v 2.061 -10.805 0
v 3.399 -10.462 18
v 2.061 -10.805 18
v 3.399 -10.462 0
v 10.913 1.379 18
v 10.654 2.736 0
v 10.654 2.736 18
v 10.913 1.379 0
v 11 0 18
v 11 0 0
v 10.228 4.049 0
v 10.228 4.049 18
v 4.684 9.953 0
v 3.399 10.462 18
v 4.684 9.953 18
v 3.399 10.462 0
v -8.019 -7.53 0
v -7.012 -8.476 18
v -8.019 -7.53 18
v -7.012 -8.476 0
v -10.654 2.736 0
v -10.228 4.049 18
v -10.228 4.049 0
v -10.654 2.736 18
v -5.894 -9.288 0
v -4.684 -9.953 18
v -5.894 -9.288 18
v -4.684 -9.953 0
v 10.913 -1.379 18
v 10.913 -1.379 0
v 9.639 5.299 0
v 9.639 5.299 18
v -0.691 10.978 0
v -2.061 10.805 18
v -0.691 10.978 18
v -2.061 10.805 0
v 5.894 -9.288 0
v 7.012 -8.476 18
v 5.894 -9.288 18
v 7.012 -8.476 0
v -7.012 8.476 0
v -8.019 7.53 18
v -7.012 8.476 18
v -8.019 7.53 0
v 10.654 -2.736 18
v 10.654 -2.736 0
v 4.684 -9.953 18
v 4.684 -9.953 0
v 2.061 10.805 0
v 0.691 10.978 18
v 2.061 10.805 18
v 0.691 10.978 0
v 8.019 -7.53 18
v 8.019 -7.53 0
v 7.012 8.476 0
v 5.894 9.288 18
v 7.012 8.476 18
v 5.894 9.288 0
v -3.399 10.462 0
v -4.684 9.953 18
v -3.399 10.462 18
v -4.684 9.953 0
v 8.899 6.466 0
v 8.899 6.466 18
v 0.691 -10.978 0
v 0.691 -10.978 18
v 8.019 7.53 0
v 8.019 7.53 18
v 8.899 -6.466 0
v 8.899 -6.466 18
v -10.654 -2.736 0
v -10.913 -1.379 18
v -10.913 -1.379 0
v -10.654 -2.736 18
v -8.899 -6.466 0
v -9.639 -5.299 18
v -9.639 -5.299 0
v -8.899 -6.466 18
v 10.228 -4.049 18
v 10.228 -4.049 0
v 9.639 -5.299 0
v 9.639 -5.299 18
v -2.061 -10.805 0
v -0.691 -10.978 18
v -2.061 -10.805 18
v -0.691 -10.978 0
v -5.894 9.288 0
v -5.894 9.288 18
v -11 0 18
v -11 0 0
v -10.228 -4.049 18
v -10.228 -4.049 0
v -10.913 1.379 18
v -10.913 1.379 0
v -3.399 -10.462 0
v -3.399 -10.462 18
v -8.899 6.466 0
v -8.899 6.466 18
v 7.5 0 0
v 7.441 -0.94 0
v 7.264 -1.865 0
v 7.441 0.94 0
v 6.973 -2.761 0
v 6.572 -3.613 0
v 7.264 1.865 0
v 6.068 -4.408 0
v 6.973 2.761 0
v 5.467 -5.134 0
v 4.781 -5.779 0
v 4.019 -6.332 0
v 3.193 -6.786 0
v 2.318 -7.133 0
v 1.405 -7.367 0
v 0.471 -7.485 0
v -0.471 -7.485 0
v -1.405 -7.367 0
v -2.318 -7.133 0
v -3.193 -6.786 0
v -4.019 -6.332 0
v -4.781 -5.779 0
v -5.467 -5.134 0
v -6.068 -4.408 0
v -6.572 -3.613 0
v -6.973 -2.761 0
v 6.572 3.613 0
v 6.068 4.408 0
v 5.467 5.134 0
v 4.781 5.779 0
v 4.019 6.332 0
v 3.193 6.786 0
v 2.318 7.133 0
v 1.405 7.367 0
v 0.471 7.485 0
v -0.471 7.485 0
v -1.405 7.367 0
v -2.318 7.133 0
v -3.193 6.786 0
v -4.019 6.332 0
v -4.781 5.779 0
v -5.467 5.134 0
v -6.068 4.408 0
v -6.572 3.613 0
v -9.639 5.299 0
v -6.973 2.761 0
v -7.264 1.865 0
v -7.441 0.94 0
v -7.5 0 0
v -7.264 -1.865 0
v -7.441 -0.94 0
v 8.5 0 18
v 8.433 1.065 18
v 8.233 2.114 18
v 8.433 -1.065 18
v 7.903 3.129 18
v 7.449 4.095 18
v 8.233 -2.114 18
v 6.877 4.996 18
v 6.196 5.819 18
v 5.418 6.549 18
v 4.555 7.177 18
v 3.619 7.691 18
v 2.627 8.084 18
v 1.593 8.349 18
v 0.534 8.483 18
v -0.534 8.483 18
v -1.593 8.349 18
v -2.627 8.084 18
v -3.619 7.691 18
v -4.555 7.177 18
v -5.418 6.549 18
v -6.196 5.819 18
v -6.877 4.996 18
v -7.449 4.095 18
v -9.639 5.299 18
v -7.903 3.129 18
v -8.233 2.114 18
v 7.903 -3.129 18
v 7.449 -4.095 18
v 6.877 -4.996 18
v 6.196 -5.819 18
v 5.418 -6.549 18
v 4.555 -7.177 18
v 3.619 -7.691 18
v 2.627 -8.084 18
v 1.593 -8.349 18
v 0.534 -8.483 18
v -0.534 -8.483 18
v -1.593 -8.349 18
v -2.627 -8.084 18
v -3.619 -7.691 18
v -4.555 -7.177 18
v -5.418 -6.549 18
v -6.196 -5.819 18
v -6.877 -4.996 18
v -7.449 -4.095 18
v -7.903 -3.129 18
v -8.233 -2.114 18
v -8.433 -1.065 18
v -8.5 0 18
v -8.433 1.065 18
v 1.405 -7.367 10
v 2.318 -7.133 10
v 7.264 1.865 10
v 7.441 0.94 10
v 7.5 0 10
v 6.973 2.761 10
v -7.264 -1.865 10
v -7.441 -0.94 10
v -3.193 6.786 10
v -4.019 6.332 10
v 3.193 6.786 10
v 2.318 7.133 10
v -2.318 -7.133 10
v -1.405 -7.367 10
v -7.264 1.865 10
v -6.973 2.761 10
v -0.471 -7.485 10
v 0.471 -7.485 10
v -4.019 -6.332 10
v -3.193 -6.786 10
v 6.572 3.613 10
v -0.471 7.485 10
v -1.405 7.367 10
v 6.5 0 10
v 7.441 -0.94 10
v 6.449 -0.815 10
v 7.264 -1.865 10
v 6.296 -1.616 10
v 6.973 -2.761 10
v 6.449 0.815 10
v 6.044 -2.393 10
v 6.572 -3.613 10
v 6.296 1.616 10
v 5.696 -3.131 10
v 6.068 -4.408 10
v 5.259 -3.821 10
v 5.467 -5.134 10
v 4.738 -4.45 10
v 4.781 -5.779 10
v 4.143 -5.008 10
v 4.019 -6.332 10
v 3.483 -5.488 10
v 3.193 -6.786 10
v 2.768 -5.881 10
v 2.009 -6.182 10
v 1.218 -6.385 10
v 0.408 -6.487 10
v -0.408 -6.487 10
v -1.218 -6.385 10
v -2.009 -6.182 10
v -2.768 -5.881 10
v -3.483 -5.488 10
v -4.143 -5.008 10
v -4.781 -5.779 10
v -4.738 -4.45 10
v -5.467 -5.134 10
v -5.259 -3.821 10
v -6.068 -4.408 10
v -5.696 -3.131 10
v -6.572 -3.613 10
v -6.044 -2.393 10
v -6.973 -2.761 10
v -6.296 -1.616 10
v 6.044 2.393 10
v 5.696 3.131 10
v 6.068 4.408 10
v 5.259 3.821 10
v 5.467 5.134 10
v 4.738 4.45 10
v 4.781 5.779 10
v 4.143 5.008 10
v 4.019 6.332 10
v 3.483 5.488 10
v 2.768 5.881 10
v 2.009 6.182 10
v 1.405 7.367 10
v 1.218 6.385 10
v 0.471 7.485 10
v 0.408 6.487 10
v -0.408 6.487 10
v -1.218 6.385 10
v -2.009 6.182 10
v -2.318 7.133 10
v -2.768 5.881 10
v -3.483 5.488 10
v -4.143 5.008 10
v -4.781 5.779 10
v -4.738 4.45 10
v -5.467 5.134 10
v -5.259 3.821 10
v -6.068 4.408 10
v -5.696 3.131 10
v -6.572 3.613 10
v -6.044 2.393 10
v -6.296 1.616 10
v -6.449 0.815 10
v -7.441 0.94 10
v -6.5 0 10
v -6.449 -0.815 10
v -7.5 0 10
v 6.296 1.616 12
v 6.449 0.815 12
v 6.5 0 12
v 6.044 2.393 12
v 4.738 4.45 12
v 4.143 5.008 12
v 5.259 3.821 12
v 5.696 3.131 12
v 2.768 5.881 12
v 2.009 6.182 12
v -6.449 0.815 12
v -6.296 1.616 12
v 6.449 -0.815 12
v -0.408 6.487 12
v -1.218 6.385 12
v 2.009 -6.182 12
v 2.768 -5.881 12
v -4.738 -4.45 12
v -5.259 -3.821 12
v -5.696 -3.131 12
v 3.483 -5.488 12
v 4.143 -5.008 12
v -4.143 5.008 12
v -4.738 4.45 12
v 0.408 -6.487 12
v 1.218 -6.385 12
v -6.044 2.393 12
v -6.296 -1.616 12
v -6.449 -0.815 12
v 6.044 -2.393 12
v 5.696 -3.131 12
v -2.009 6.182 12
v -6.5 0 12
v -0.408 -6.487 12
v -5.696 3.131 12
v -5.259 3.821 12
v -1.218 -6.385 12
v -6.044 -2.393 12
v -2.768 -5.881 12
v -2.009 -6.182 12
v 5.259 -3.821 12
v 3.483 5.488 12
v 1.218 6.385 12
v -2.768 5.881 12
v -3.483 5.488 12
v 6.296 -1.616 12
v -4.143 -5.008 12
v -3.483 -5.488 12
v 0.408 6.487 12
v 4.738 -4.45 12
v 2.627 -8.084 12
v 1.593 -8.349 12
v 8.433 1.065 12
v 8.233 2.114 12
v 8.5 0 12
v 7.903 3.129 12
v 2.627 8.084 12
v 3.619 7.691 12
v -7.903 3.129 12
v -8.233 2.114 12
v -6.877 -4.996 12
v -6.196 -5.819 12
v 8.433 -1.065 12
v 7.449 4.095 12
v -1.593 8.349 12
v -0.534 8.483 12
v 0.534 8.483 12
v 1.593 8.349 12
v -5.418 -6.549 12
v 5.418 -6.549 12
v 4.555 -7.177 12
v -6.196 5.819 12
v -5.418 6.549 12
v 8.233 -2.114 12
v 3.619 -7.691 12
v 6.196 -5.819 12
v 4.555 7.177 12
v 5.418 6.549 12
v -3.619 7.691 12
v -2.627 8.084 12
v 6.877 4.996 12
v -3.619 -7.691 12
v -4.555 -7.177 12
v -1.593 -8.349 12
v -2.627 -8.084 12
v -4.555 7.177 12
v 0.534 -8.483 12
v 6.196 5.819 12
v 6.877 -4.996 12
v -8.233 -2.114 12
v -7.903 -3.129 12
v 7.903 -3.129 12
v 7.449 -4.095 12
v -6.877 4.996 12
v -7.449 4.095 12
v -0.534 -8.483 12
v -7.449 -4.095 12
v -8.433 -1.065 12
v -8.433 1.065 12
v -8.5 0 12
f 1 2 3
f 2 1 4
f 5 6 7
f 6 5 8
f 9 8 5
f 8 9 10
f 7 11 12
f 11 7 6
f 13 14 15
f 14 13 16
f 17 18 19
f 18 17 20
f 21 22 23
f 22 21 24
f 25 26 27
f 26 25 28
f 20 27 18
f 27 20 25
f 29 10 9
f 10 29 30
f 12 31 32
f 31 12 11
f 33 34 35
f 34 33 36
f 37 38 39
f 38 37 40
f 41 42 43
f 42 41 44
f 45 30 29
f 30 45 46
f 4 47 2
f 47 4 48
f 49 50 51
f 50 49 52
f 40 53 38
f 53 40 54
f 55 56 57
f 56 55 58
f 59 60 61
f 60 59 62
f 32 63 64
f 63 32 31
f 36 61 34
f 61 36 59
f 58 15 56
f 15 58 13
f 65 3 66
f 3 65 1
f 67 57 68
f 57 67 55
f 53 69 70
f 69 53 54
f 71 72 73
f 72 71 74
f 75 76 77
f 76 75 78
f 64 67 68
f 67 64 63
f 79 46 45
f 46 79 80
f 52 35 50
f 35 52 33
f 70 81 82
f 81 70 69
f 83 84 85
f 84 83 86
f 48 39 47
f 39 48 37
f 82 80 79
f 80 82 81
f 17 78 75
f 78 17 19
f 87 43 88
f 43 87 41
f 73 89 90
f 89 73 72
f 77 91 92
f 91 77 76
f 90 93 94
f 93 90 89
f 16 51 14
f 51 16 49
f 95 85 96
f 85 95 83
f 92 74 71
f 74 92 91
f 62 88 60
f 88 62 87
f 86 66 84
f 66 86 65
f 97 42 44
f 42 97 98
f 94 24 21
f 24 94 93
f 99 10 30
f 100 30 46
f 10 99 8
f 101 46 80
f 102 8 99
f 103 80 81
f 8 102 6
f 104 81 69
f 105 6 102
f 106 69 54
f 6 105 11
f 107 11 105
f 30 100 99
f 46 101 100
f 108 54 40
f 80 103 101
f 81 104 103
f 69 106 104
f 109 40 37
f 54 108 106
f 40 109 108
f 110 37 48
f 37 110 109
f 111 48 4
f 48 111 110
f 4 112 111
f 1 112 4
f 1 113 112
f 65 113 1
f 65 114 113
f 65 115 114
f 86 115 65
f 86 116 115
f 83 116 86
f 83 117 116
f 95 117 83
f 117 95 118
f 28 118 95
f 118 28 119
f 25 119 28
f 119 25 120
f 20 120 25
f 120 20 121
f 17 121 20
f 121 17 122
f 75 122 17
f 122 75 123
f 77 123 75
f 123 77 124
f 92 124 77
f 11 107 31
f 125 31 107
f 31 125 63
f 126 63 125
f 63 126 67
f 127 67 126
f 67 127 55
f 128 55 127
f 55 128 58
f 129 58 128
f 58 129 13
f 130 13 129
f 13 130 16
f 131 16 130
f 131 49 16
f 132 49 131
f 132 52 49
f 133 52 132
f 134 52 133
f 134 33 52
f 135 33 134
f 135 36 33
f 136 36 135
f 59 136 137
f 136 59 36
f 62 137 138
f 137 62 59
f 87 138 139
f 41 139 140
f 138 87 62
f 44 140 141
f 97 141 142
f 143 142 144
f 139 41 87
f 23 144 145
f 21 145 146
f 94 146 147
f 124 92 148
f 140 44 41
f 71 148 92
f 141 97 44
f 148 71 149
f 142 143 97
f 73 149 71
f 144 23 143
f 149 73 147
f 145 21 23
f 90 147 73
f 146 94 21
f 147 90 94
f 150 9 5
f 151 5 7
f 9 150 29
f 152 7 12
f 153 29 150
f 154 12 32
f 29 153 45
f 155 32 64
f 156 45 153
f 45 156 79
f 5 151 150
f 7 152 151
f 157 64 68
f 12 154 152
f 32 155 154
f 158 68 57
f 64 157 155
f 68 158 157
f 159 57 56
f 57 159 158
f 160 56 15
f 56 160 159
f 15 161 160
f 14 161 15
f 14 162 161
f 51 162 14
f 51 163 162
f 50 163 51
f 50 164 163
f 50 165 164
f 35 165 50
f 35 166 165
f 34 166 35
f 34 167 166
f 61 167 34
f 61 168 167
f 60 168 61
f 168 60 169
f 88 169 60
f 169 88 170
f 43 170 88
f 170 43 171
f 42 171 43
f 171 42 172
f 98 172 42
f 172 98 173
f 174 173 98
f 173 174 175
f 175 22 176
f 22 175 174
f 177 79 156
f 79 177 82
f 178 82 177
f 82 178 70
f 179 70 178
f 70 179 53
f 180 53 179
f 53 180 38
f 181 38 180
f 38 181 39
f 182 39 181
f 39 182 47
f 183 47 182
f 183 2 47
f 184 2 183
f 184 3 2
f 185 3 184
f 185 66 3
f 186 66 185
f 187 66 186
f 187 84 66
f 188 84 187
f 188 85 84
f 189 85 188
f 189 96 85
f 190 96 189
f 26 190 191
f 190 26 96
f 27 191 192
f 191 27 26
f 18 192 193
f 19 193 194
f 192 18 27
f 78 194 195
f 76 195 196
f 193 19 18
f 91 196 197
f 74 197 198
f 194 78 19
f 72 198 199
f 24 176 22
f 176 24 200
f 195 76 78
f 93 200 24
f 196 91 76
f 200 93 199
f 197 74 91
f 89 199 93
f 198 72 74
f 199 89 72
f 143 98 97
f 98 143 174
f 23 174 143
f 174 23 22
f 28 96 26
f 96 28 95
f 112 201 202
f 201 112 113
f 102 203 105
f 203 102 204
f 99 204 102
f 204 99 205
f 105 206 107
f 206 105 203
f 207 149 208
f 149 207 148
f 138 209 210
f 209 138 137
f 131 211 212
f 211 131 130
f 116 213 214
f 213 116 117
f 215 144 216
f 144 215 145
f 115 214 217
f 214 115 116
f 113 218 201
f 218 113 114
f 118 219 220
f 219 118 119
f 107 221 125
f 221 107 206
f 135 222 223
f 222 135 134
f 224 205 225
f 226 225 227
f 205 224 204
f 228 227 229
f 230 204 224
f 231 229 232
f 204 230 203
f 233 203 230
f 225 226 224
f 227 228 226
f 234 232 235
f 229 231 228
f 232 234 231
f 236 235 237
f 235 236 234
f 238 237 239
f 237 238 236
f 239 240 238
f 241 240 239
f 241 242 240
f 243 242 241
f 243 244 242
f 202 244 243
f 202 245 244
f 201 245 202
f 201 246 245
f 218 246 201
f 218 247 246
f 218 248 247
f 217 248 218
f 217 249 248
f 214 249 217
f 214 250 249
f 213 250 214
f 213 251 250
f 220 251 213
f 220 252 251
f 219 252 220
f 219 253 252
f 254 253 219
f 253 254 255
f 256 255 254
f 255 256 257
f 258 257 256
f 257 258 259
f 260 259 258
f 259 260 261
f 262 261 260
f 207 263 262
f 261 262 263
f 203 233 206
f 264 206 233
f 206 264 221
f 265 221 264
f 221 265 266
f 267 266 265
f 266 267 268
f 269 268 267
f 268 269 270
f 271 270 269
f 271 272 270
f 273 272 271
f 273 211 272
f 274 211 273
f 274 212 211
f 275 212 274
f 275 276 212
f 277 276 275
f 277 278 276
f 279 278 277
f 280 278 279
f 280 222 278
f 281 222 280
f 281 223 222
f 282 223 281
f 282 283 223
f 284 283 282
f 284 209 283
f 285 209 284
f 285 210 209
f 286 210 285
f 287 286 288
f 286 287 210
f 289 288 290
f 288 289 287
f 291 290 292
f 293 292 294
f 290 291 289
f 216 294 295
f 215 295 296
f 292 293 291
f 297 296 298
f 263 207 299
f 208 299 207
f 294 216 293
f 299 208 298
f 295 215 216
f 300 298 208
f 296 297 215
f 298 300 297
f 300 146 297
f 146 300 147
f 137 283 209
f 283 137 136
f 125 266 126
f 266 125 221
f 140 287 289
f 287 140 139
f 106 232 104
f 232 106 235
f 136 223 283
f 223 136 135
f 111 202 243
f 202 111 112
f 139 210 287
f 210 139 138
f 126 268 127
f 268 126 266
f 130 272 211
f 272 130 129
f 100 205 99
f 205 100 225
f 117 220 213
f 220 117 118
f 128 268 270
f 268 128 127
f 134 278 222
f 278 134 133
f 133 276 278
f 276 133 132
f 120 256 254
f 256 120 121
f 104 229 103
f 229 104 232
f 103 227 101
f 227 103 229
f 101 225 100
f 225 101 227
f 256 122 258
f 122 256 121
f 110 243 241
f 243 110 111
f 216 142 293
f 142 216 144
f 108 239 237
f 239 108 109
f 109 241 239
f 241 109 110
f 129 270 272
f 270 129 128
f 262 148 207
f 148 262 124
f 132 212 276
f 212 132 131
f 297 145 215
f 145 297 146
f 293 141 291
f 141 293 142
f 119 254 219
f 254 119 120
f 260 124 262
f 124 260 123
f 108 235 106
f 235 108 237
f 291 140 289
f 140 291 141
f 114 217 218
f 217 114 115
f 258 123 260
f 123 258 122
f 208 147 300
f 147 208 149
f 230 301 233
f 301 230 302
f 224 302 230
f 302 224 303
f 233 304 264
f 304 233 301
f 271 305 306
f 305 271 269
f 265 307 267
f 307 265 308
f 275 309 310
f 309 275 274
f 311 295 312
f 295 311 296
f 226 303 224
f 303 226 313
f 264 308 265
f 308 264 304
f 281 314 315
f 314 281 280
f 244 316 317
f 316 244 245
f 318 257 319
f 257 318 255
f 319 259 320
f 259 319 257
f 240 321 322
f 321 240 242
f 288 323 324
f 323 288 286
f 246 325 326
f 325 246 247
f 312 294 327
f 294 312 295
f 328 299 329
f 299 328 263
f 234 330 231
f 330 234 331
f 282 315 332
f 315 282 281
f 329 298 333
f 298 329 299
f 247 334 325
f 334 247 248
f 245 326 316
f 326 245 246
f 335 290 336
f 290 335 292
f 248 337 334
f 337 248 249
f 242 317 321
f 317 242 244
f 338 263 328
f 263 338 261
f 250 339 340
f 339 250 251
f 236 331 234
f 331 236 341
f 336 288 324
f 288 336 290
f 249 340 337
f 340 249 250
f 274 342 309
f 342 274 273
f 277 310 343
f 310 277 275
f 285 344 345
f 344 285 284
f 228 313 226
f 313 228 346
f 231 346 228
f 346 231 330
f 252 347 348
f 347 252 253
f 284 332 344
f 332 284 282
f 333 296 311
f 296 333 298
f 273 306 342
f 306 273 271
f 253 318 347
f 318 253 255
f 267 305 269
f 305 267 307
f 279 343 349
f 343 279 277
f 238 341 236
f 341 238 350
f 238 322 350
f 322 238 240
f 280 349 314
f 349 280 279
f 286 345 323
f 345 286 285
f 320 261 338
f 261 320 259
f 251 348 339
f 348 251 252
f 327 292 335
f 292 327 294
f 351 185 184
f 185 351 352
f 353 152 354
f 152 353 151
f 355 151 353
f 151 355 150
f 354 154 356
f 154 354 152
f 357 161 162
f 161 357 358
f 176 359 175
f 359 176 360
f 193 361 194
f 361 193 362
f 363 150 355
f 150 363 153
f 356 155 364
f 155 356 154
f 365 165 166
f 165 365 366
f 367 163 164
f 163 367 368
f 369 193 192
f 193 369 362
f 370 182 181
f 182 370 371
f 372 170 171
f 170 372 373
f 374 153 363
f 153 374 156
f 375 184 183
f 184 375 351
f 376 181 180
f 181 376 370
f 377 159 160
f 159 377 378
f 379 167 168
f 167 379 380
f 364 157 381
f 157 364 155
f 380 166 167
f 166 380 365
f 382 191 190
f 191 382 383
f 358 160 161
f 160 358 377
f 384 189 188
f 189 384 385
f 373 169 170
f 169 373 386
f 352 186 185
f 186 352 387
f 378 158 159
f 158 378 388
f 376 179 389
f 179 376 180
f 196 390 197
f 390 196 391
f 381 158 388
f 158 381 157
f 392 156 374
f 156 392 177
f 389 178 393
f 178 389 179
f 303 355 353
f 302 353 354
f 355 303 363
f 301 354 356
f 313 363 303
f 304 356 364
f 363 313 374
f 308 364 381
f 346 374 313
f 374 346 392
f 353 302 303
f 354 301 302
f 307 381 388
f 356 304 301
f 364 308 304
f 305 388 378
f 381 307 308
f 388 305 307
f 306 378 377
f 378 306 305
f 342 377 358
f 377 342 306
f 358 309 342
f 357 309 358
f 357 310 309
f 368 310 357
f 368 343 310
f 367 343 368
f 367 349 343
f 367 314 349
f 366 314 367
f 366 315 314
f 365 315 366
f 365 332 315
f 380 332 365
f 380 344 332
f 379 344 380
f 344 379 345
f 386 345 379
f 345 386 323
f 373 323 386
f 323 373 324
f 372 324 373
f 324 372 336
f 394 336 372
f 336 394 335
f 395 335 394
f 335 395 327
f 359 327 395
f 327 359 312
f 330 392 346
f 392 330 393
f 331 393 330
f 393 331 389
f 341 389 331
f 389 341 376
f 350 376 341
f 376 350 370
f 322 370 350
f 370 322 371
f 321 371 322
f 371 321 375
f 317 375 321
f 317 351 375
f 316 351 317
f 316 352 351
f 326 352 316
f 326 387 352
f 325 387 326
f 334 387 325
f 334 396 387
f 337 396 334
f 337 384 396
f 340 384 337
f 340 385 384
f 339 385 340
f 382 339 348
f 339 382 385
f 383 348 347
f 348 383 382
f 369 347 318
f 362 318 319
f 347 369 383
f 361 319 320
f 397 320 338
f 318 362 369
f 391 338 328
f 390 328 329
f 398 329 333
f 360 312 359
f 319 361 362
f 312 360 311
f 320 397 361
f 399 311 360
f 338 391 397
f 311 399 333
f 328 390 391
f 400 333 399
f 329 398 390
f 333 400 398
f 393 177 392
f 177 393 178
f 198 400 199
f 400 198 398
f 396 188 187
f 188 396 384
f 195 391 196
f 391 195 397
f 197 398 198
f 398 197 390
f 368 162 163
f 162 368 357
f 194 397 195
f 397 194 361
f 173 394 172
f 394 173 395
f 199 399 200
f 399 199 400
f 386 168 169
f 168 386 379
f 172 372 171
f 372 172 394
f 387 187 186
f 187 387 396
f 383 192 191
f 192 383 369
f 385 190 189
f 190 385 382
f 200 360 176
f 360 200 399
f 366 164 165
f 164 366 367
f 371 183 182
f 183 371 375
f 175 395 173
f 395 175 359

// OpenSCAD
$fn = 50;
difference() { 
    cylinder(d = 22, h = 6 + 2 + 10);
    cylinder(d = 15, h = 10);
    cylinder(d = 13, h = 100);
    translate([0,0,10+2])
    cylinder(d = 17, h=100);
}
